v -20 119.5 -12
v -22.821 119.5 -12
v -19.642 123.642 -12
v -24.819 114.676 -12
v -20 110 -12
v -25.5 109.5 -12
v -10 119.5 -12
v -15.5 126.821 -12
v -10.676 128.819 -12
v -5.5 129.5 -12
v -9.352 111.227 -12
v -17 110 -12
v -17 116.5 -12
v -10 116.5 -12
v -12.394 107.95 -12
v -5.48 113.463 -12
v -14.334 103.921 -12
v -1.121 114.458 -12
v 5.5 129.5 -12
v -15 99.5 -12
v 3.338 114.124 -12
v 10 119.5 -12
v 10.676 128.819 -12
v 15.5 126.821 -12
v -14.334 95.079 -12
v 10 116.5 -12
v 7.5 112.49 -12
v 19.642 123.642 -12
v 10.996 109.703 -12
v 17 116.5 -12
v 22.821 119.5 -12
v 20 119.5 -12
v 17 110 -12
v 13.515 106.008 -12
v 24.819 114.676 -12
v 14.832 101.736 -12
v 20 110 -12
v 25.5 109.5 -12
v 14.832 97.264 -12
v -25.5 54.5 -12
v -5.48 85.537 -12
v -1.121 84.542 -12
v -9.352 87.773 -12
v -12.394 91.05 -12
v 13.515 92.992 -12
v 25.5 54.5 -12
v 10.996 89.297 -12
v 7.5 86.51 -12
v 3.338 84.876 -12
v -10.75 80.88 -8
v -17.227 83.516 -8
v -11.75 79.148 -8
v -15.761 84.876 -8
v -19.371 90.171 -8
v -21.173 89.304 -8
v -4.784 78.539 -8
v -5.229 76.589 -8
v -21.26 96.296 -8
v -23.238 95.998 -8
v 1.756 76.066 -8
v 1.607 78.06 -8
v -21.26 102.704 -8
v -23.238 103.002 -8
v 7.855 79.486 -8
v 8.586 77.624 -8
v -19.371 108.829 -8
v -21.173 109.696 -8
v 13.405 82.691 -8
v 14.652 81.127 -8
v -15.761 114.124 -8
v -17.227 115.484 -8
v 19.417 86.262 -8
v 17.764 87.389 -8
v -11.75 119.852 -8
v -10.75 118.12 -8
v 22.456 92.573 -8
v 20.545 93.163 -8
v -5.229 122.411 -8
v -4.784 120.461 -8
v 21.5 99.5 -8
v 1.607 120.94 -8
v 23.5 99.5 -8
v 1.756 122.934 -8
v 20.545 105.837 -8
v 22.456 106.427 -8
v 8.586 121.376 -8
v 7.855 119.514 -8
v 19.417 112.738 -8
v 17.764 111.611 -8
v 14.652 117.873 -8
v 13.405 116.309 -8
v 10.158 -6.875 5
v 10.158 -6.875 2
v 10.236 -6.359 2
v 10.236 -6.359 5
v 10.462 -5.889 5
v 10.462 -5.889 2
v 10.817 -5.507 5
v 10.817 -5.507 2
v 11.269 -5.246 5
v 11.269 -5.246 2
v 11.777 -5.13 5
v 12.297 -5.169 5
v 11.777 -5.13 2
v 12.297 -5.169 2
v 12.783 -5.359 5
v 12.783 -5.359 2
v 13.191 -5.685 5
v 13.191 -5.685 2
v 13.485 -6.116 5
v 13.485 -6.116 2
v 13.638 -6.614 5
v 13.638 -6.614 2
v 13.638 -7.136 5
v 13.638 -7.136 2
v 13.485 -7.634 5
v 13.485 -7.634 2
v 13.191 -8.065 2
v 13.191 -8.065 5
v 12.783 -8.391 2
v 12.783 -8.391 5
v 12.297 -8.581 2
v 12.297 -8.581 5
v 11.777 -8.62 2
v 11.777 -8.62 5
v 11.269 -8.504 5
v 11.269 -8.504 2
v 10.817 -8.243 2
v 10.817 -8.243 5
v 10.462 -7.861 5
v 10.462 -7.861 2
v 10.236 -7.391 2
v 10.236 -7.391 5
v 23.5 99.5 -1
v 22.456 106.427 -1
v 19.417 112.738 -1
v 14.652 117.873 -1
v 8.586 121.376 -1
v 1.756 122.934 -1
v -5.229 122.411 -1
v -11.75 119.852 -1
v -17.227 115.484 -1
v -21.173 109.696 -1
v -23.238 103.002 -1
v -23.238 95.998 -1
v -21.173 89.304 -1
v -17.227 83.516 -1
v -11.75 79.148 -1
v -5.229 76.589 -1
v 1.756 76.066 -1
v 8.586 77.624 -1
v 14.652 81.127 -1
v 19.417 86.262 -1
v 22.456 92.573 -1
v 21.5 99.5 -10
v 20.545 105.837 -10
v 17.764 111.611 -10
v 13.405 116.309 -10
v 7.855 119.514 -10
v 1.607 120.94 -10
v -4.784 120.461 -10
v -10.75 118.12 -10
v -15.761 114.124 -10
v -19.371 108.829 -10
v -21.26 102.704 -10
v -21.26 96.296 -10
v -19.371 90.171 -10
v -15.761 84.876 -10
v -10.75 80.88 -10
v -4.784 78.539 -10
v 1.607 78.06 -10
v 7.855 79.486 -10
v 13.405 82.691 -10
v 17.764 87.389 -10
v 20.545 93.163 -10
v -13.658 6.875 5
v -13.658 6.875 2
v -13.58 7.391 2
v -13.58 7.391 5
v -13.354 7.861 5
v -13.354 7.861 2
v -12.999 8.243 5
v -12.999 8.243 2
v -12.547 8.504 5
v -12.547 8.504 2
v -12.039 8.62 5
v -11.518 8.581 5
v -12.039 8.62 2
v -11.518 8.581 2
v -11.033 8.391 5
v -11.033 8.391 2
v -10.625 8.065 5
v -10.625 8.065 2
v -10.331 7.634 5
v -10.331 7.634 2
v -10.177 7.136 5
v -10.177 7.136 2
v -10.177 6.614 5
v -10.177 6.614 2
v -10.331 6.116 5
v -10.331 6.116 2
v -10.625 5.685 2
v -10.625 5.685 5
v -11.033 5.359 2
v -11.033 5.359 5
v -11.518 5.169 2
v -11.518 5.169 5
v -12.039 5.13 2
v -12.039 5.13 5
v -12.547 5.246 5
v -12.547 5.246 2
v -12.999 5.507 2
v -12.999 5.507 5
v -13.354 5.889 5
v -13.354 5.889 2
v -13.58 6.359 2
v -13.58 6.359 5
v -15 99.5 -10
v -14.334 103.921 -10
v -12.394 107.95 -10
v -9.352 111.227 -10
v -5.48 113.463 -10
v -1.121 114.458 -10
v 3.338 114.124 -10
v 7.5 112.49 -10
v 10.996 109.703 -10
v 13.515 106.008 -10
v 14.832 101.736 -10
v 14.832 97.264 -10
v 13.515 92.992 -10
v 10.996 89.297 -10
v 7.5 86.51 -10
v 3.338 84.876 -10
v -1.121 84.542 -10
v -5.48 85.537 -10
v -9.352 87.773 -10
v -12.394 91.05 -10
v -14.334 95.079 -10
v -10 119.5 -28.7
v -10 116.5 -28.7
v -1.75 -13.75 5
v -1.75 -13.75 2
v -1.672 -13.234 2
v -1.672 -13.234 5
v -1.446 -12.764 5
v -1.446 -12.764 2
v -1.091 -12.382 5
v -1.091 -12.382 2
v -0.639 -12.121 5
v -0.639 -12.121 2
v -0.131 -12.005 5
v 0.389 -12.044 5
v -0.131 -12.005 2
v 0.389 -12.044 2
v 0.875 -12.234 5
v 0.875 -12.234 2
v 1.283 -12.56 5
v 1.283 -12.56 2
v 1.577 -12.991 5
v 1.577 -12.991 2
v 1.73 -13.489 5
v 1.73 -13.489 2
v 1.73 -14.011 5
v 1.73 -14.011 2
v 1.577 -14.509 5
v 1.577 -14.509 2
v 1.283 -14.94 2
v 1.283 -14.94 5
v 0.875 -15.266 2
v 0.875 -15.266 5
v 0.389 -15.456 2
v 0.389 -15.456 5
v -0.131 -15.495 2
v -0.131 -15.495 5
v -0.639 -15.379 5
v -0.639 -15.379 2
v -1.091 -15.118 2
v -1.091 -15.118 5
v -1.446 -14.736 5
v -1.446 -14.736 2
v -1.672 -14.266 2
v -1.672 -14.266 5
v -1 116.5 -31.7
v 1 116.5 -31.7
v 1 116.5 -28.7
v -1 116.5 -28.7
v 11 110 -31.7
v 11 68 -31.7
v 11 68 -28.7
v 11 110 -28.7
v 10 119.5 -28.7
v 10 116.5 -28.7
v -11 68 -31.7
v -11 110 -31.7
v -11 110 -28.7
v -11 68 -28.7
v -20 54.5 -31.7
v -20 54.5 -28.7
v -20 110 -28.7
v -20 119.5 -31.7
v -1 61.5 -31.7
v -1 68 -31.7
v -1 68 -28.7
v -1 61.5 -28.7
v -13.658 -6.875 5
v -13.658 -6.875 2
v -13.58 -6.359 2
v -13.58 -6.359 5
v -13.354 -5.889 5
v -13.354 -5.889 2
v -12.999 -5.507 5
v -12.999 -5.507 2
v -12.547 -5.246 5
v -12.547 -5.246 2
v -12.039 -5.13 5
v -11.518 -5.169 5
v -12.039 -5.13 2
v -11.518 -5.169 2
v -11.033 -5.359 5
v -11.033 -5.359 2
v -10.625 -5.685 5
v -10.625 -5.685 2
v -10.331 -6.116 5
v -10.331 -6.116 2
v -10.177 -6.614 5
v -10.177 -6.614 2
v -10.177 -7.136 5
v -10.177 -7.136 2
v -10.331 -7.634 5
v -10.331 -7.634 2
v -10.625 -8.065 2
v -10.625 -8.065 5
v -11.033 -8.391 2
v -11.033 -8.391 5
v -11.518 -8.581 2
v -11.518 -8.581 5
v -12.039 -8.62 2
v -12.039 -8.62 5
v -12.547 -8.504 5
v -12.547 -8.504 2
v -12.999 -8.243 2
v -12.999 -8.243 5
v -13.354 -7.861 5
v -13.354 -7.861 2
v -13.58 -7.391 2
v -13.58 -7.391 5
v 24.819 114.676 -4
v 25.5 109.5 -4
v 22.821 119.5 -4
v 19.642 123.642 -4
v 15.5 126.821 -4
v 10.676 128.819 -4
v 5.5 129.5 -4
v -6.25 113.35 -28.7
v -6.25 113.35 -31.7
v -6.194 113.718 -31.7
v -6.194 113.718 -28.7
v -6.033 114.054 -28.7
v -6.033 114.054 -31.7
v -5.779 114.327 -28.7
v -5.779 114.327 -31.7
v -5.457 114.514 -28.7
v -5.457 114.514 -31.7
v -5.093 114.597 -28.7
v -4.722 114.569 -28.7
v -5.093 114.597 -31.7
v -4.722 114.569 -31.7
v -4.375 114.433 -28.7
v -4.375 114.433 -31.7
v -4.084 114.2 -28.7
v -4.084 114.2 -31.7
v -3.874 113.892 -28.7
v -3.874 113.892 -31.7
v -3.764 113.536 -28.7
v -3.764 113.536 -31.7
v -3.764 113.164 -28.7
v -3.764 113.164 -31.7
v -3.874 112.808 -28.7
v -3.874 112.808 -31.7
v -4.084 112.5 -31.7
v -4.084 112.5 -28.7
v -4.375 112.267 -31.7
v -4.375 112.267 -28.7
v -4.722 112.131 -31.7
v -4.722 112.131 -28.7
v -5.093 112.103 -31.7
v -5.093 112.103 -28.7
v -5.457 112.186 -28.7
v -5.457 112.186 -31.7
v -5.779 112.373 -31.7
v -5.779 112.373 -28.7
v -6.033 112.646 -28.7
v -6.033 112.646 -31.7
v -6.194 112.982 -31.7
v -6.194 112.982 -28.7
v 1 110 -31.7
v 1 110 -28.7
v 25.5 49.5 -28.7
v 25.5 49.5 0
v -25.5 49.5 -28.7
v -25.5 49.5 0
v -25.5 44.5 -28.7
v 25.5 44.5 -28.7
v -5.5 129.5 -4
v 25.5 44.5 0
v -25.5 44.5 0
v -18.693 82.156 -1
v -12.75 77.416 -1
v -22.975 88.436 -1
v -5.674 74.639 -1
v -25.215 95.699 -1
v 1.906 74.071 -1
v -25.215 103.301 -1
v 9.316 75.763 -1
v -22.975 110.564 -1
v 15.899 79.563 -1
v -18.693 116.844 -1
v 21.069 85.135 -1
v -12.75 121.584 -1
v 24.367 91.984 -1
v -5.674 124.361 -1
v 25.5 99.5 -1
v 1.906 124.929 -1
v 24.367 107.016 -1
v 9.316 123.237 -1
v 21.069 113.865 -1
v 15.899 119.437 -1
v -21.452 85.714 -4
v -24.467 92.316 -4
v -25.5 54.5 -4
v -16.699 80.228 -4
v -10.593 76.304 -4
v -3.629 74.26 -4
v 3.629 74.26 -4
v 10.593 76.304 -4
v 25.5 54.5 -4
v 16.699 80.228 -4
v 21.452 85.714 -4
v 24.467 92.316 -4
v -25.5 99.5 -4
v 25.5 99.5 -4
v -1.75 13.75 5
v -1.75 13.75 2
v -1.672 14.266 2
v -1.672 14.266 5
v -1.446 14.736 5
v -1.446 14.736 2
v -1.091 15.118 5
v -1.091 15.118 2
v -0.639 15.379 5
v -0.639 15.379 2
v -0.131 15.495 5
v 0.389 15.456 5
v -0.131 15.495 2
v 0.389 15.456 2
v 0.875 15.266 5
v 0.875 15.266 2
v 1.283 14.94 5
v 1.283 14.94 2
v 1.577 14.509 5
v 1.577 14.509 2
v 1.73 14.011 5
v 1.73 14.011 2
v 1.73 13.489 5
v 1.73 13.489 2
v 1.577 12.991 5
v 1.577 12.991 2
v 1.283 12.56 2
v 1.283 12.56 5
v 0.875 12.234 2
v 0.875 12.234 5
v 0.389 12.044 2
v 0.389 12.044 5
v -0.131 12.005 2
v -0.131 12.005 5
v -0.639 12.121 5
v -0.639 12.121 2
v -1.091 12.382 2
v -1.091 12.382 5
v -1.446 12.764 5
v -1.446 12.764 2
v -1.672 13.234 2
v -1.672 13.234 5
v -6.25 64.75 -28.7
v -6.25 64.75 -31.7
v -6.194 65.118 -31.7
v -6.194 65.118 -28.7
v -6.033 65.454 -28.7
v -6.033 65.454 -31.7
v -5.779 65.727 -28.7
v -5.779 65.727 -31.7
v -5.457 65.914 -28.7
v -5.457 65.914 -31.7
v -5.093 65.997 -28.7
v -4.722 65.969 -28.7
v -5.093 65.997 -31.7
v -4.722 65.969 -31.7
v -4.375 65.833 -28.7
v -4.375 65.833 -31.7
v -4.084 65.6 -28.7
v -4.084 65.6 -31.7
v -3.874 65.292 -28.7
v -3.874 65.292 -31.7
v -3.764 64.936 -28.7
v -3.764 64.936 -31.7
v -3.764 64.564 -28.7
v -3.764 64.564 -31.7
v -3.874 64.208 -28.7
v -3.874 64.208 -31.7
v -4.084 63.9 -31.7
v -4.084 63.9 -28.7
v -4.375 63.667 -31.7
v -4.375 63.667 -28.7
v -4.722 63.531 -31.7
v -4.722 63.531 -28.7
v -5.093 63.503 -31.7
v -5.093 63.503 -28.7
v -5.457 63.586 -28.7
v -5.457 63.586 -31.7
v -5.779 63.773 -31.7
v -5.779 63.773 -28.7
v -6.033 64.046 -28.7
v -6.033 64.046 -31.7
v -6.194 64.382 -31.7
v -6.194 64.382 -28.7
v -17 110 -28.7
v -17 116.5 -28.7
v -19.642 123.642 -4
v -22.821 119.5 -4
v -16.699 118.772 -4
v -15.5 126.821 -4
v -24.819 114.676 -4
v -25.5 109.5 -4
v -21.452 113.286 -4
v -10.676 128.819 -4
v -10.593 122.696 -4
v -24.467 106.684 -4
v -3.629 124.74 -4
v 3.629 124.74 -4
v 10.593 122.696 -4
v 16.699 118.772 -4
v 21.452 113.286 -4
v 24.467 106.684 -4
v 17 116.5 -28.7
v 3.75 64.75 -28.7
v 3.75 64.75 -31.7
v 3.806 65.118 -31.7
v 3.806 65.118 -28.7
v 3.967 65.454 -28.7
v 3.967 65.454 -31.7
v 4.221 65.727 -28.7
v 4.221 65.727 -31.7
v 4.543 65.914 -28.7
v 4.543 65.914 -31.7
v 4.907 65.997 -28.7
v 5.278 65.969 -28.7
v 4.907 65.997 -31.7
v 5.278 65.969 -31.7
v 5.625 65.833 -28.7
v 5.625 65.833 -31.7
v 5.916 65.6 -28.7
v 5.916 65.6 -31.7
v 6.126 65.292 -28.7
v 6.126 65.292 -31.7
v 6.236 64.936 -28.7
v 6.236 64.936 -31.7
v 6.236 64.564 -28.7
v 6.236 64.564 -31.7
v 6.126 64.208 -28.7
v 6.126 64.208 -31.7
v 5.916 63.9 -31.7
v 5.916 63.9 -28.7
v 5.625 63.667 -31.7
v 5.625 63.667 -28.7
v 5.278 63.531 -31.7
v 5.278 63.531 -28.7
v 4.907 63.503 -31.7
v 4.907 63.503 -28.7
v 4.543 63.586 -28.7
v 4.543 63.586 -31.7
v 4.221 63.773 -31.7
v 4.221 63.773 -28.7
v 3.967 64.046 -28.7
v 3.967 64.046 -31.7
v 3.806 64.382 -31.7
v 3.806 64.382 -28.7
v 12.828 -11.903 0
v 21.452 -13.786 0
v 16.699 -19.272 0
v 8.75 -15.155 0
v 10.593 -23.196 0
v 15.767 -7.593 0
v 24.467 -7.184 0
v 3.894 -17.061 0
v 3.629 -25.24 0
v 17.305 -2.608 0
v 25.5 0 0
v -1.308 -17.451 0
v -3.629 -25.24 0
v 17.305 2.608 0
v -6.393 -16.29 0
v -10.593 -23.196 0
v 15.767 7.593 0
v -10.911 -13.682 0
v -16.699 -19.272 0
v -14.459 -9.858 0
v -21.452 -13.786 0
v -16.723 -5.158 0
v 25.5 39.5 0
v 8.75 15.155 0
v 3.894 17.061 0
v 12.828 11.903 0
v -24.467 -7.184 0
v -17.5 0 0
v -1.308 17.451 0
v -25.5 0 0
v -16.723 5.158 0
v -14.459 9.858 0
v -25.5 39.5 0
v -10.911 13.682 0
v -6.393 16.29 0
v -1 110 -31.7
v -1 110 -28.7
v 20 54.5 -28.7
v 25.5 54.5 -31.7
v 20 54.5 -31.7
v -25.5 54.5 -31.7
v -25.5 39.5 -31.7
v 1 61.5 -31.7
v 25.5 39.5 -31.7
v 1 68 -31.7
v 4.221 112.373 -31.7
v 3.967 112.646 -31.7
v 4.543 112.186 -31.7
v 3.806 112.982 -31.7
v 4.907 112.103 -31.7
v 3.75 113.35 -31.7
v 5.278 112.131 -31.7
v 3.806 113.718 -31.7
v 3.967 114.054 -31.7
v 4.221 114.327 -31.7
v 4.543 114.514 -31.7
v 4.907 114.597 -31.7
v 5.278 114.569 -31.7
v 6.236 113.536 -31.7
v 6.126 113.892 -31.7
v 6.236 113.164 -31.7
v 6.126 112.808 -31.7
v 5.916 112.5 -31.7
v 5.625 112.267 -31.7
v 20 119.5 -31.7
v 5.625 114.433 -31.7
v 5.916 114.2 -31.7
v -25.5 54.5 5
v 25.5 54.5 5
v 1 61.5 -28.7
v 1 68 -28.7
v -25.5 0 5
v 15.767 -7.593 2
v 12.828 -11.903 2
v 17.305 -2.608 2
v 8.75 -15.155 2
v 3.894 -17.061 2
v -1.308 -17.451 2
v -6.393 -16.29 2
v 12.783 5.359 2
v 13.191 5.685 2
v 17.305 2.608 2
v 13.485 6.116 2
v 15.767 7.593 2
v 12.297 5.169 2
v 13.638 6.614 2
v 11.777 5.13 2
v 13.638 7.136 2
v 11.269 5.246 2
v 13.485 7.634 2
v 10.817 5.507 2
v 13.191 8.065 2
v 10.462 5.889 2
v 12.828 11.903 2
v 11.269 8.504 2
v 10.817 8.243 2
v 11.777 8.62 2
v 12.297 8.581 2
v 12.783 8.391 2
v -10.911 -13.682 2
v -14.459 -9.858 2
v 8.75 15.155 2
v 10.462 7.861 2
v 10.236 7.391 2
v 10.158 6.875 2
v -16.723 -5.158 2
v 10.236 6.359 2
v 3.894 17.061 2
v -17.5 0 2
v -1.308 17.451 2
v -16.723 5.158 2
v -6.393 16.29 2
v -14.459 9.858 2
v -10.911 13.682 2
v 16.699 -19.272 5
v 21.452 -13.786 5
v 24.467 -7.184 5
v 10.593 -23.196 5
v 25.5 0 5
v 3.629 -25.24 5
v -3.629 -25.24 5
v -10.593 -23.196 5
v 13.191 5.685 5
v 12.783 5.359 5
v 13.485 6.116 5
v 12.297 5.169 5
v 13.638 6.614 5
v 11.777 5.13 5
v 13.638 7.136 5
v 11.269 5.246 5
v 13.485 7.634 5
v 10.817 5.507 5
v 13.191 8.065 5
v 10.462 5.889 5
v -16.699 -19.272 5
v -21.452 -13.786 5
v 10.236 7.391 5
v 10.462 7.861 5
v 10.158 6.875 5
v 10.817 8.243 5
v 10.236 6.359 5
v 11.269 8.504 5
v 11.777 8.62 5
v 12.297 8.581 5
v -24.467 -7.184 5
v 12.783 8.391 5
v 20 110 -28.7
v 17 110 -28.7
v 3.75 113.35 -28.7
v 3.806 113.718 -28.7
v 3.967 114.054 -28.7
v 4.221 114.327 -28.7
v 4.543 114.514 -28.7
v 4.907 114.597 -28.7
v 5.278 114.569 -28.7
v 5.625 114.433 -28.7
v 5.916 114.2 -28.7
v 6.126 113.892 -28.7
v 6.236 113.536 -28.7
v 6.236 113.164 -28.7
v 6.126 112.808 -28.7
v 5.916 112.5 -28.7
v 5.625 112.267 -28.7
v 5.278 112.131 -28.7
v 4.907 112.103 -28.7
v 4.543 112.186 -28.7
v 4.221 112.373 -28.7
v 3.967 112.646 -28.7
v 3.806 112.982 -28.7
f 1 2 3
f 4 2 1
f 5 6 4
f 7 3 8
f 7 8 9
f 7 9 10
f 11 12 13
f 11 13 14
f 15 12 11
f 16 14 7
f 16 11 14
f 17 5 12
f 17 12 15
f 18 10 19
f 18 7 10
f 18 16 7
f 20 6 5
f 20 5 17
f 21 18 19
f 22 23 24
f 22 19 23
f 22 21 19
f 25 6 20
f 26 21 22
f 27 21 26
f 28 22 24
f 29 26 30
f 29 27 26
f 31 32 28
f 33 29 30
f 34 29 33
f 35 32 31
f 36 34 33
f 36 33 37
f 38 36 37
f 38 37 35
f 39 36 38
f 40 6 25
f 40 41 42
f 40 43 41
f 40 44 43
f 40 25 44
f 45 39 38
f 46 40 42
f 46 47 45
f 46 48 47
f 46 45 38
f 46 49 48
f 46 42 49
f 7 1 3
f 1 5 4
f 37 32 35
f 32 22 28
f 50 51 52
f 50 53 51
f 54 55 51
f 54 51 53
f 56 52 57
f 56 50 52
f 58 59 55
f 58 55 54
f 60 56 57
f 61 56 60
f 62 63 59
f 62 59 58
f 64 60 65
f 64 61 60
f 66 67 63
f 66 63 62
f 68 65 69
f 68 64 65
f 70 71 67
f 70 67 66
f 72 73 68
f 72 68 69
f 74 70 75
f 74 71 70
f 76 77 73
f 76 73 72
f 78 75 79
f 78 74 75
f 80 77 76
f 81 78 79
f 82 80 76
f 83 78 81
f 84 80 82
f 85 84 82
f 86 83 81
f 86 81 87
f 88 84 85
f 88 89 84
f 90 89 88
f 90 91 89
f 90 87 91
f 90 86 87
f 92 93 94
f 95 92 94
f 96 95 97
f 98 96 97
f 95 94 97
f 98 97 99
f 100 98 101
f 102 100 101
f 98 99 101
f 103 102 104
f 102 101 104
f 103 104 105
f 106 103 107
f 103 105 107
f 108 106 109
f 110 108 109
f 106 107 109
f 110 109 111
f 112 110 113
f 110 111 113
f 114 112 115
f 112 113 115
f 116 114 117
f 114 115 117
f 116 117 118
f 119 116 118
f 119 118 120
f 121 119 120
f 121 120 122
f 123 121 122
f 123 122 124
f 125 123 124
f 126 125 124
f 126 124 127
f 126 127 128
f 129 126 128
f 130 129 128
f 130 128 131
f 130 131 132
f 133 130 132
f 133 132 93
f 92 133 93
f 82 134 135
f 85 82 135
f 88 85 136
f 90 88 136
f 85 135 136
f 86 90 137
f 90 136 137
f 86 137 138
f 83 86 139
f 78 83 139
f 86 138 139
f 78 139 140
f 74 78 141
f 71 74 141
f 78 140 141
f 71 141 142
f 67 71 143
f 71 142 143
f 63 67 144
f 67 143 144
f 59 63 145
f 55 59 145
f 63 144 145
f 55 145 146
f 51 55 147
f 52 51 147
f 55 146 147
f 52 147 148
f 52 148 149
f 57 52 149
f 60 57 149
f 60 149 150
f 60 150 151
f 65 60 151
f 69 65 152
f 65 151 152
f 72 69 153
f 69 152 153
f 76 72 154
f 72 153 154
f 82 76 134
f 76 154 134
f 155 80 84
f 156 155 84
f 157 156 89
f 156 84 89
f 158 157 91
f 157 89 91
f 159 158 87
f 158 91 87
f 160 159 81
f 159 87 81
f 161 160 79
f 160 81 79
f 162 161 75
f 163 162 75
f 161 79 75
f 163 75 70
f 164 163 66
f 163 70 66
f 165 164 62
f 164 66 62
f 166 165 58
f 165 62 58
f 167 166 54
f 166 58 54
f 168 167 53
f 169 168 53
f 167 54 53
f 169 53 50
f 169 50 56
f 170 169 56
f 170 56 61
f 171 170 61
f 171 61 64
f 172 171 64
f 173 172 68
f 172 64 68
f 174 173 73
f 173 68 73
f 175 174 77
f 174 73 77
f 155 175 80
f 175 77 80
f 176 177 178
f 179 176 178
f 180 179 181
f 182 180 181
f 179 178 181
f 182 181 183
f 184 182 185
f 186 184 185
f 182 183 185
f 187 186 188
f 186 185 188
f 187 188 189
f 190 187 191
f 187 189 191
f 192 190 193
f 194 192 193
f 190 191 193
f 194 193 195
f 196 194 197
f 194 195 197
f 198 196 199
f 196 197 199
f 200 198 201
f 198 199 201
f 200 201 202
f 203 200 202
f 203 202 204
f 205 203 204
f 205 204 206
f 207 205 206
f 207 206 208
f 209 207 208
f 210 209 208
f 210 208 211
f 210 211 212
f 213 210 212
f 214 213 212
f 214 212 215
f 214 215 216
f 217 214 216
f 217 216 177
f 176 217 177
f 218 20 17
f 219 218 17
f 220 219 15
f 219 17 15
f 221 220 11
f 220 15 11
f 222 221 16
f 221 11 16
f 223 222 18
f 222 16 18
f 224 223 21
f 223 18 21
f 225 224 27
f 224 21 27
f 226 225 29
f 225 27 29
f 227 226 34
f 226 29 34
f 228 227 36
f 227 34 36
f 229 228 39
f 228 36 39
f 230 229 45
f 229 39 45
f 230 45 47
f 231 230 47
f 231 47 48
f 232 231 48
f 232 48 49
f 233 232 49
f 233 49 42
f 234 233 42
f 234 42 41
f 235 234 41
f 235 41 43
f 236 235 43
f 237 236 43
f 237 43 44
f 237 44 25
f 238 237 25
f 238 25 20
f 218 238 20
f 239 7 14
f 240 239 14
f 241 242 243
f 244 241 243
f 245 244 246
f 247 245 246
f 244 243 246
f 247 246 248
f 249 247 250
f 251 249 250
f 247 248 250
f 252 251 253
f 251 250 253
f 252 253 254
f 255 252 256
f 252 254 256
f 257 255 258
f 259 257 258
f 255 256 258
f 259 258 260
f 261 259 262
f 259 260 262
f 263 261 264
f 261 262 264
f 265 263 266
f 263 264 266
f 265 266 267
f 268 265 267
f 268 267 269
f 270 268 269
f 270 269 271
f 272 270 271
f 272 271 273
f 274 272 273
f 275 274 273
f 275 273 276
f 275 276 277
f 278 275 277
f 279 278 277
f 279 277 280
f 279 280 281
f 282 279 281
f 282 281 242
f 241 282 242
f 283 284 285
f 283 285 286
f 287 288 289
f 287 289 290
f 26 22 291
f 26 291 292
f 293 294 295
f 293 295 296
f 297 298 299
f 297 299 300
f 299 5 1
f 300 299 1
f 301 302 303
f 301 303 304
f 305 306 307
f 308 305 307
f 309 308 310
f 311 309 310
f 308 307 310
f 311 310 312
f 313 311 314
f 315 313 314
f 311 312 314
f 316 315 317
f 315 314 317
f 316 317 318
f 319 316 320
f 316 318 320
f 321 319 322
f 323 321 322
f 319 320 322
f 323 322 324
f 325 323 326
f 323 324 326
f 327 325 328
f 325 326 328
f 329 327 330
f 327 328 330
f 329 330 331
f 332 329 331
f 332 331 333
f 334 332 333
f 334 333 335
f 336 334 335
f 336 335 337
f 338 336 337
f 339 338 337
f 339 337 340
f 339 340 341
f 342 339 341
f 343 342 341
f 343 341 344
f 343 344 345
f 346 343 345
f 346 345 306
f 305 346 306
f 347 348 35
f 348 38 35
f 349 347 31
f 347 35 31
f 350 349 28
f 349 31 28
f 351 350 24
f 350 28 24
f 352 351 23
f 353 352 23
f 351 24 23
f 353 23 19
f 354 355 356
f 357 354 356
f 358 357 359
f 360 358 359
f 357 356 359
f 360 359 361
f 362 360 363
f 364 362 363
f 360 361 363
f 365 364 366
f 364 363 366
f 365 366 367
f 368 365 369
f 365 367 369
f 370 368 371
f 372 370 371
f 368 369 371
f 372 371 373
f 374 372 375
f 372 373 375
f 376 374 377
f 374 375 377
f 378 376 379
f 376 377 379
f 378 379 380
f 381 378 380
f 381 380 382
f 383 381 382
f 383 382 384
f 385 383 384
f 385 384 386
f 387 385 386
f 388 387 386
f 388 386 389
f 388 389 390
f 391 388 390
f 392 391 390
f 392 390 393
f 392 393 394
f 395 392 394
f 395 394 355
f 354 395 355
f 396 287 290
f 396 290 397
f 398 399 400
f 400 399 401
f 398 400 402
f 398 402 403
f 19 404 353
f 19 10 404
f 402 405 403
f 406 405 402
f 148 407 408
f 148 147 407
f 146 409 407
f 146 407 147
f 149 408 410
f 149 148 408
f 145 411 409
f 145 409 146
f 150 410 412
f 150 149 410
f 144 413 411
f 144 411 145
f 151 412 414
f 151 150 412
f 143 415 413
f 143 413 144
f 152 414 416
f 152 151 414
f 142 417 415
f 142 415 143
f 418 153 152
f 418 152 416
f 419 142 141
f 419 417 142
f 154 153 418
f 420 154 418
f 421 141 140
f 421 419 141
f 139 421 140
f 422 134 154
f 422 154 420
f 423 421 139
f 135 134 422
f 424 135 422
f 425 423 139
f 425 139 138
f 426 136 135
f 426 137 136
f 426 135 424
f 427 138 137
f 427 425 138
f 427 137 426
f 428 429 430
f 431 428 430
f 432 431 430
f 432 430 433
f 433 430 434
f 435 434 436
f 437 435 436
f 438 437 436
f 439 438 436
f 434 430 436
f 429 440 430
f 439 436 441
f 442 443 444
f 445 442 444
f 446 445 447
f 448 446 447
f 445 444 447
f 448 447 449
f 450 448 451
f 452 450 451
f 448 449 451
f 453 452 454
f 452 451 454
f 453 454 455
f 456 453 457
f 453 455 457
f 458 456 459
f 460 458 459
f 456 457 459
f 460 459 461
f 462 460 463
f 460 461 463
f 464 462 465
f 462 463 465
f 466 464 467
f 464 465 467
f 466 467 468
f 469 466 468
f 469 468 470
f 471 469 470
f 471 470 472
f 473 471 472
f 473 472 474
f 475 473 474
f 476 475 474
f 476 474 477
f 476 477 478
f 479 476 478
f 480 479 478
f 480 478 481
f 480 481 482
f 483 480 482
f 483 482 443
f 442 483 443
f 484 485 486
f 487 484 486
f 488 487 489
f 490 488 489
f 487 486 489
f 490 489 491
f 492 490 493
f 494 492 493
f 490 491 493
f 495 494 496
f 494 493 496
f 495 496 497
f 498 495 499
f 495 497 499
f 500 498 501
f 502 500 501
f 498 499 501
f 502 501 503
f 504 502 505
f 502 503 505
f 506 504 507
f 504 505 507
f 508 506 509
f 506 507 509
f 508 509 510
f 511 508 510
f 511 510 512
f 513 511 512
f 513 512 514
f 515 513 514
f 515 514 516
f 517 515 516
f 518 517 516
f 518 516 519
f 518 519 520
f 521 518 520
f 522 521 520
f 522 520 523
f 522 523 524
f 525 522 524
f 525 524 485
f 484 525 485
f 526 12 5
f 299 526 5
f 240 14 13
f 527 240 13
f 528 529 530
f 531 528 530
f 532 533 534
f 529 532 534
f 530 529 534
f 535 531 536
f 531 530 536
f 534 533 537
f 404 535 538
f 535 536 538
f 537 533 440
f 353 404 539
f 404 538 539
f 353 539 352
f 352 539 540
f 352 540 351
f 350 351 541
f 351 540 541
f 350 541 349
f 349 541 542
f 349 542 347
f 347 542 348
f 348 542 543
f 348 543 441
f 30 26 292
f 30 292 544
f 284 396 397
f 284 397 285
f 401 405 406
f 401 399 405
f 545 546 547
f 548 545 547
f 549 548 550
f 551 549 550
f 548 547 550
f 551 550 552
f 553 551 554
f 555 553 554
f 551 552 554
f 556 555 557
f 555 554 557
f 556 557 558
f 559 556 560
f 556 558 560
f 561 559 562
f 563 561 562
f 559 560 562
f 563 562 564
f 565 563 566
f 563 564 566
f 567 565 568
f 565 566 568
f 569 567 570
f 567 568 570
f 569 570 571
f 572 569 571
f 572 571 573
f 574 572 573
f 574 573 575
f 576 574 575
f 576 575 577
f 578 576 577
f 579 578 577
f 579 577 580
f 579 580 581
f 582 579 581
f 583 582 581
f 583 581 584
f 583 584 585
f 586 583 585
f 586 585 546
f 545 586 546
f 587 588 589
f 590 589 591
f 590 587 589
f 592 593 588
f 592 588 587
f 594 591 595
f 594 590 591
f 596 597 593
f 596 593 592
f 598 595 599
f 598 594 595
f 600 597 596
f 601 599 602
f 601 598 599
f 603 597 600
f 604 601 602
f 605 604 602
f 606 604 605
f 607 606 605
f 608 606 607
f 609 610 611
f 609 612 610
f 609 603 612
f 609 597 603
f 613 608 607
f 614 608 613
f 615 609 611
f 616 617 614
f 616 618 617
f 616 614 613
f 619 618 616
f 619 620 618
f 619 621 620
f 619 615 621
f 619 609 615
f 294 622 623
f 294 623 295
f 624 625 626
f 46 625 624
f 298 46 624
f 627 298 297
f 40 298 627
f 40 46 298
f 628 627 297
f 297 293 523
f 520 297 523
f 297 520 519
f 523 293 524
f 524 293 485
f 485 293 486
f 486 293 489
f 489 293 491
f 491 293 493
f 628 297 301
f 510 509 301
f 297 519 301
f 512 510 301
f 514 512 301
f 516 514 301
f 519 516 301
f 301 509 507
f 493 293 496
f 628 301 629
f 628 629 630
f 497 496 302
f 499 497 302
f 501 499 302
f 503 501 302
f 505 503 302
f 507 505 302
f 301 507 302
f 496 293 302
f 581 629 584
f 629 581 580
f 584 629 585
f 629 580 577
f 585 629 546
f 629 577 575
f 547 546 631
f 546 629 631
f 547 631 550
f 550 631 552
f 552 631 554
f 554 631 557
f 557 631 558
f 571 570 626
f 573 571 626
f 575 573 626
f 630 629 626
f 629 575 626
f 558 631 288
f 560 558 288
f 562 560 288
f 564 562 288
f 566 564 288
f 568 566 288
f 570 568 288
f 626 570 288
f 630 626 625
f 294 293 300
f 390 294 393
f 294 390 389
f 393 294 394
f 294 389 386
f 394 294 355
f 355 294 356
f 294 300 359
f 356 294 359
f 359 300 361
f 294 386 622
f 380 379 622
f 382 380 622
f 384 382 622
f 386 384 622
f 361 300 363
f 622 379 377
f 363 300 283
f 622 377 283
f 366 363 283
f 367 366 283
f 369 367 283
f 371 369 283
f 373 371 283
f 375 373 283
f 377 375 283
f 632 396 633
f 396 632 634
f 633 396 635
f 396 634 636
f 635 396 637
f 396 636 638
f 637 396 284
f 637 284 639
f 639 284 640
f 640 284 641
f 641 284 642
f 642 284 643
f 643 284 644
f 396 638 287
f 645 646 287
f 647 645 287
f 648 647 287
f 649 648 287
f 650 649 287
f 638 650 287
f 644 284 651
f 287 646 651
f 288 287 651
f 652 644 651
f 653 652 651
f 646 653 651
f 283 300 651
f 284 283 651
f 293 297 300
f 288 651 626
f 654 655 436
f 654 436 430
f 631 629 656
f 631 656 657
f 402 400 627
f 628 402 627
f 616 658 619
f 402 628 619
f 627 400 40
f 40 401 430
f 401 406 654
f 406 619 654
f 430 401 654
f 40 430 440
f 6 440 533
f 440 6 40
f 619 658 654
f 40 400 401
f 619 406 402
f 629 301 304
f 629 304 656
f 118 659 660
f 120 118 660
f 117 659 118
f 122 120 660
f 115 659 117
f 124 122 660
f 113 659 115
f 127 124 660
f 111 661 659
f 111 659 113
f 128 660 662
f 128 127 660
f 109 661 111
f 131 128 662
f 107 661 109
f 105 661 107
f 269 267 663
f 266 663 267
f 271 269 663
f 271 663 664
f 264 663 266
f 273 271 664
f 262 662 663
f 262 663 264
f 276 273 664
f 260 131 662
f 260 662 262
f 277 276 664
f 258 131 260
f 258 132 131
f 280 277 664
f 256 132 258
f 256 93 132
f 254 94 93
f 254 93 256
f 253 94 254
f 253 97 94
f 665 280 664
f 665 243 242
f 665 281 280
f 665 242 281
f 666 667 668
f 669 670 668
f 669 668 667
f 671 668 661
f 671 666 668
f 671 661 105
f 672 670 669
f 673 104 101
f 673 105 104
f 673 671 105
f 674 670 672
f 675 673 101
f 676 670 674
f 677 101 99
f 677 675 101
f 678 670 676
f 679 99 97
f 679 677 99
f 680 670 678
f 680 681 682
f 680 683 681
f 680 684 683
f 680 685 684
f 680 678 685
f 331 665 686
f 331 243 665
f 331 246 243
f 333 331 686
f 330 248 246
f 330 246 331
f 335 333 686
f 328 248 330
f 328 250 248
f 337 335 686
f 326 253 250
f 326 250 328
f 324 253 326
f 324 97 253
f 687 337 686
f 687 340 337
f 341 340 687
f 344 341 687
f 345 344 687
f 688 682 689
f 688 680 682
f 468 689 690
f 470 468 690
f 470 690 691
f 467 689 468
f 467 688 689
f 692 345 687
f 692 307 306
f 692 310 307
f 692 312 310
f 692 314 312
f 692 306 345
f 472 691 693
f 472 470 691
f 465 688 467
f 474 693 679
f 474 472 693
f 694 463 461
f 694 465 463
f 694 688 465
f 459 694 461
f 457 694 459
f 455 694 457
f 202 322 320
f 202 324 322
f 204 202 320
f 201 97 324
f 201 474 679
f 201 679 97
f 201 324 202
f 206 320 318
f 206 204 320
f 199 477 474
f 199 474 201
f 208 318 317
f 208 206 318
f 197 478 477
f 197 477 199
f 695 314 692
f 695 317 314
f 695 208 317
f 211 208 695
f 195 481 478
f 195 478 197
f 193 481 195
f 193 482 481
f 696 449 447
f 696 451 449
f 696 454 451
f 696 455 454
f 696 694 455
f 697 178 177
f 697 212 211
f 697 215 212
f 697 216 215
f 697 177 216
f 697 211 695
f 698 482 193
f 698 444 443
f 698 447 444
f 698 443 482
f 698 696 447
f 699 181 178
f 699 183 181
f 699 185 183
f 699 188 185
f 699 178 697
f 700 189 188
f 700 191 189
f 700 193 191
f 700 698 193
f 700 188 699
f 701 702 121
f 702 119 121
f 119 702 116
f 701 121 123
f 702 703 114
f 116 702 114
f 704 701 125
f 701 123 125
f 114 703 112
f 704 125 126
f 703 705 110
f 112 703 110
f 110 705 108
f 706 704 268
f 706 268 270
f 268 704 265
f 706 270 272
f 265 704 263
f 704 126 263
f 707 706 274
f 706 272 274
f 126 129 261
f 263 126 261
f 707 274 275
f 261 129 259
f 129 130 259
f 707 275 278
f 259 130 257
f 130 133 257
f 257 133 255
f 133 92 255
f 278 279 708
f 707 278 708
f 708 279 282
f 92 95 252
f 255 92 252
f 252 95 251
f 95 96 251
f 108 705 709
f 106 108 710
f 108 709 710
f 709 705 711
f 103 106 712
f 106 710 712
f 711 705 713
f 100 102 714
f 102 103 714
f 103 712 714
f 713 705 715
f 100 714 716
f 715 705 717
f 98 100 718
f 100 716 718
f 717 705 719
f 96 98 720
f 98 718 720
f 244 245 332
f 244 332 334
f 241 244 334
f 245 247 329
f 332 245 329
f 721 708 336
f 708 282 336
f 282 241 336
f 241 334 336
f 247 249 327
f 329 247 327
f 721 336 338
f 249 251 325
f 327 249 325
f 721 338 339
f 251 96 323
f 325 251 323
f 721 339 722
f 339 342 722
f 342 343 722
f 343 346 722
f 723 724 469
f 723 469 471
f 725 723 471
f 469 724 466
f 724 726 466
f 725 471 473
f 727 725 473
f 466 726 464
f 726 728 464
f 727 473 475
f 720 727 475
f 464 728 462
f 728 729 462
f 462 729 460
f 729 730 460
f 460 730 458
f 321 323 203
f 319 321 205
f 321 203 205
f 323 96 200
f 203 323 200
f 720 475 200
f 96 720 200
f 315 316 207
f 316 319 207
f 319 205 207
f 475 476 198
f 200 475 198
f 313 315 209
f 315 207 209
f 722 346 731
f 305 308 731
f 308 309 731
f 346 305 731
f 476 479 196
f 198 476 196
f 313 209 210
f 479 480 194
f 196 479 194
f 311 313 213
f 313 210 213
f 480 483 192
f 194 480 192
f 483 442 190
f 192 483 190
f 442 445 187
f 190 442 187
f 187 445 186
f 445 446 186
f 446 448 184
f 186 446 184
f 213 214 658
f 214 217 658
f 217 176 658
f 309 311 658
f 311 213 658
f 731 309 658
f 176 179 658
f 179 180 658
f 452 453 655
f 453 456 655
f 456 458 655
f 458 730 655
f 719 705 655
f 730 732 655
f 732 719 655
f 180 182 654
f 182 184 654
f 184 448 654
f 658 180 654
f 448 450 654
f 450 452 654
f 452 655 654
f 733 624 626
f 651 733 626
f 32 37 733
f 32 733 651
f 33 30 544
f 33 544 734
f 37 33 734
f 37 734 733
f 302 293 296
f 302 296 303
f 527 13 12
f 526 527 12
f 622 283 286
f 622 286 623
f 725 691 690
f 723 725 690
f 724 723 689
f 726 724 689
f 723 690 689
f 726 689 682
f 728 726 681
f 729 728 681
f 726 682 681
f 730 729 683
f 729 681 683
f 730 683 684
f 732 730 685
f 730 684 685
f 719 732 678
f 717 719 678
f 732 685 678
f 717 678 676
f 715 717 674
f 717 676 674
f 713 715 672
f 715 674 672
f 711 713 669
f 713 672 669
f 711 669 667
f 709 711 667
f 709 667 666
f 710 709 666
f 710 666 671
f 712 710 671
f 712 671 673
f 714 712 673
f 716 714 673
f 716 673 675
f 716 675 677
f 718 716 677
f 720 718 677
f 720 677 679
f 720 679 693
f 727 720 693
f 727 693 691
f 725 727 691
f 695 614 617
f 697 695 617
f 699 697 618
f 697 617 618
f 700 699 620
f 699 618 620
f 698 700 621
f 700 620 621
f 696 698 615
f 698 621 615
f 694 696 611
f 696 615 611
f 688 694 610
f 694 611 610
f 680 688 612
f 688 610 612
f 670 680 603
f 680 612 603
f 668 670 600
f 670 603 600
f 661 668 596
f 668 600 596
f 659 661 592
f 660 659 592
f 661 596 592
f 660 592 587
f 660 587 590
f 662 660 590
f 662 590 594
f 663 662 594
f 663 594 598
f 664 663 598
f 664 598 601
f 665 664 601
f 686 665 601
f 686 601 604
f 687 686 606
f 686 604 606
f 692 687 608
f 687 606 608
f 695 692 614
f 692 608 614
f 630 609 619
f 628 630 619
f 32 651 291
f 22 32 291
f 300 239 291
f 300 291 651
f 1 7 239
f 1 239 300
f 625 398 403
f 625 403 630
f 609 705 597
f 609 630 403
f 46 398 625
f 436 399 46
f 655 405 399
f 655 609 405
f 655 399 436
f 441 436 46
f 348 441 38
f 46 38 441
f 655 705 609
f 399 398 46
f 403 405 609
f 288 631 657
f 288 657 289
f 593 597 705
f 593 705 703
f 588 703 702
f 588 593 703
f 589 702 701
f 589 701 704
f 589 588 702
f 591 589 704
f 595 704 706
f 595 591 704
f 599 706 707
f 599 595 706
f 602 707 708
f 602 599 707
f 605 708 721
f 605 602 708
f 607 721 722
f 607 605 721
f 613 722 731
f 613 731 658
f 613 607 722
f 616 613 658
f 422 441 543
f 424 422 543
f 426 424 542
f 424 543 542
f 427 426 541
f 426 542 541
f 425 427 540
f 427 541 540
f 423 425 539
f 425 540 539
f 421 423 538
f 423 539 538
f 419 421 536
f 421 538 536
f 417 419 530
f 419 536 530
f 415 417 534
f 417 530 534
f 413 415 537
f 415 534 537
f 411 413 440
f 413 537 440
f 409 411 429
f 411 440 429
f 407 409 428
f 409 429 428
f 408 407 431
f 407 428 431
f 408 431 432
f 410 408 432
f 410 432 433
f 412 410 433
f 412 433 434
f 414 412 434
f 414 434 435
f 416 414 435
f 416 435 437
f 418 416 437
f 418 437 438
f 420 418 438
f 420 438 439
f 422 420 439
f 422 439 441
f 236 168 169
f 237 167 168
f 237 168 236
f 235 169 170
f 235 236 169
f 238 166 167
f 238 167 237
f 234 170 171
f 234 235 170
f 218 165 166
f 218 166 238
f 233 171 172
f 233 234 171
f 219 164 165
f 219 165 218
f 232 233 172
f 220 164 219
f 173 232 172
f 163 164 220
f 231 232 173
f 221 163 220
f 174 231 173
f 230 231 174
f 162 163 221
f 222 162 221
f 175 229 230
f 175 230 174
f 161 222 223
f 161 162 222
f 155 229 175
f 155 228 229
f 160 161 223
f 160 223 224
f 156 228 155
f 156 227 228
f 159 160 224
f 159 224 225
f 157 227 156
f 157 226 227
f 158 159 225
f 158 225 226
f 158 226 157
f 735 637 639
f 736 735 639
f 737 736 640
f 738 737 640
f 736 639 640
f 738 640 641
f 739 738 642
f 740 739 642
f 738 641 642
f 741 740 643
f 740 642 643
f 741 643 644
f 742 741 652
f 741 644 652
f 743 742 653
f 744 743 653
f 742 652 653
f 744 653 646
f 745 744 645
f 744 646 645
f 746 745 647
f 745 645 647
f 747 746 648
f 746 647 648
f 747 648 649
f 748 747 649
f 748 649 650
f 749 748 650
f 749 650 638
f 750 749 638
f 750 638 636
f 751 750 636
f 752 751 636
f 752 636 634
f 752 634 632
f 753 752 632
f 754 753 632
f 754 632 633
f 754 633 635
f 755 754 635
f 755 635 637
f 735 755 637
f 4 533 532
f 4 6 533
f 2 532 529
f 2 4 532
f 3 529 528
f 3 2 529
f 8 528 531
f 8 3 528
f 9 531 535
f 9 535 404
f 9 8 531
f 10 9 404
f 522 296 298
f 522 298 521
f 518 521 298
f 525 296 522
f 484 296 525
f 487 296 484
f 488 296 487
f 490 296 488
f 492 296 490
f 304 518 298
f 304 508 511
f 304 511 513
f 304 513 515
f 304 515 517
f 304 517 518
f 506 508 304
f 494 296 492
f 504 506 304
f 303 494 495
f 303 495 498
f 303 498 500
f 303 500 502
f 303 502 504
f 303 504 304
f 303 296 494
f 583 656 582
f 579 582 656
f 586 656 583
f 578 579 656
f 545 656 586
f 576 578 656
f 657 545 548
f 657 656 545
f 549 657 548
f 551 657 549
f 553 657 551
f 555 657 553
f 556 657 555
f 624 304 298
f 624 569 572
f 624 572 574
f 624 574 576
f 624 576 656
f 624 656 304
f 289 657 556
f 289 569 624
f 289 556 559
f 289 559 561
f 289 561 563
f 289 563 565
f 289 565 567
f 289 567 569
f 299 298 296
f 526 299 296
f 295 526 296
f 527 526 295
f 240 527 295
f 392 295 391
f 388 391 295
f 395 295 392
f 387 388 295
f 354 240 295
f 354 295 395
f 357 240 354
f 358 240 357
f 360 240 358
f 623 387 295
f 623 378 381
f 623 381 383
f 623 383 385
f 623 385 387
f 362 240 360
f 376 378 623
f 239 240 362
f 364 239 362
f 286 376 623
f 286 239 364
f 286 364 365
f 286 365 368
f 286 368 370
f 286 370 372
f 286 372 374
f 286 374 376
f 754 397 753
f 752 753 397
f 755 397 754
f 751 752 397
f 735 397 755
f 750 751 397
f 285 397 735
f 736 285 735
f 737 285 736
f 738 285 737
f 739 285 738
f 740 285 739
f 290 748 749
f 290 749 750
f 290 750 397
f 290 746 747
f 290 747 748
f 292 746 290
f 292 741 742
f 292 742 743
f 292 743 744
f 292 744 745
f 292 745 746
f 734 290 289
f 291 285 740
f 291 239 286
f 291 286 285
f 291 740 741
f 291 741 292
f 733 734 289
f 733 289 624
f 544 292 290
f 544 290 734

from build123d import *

# Parameters (mm, degrees)
EXTRUDE_1_DEPTH     = 5
SKETCH_2_R          = 17.5
CUT_EXTRUDE_1_DEPTH = 2
SKETCH_3_R          = 1.75
CUT_EXTRUDE_2_DEPTH = 61.245331769
SKETCH_4_W          = 51
SKETCH_4_H          = 5
EXTRUDE_2_DEPTH     = 31.7
SKETCH_12_W         = 51
SKETCH_12_H         = 8
EXTRUDE_7_DEPTH     = 75
FILLET_2_R          = 20
CUT_EXTRUDE_6_REACH = 135.449
SKETCH_13_R         = 15
SKETCH_14_R         = 25.5
EXTRUDE_8_DEPTH     = 3
SKETCH_16_R         = 23.5
CUT_EXTRUDE_7_DEPTH = 7
SKETCH_17_R         = 21.5
CUT_EXTRUDE_8_DEPTH = 2
EXTRUDE_9_DEPTH     = 19.7
EXTRUDE_10_DEPTH    = 3
CUT_EXTRUDE_9_REACH = 138.994
SKETCH_20_R         = 1.25


with BuildPart() as part:
    # 스케치1 → 보스-돌출1 (new body)
    with BuildSketch(Plane.XY):
        with BuildLine():
            Line((-25.5, 0), (-25.5, 54.5))
            Line((-25.5, 54.5), (25.5, 54.5))
            Line((25.5, 54.5), (25.5, 0))
            ThreePointArc((25.5, 0), (0, -25.5), (-25.5, 0))
        make_face()
    extrude(amount=EXTRUDE_1_DEPTH)

    # 스케치2 → 컷-돌출1 (cut)
    with BuildSketch(Plane(origin=(0, 0, 0), x_dir=(-1, 0, 0), z_dir=(0, 0, -1))):
        Circle(SKETCH_2_R)
    extrude(amount=-CUT_EXTRUDE_1_DEPTH, mode=Mode.SUBTRACT)

    # 스케치3 → 컷-돌출2 (cut, through all)
    with BuildSketch(Plane(origin=(0, 0, 2), x_dir=(-1, 0, 0), z_dir=(0, 0, -1))):
        with Locations((0, 13.75)):
            Circle(SKETCH_3_R)
        with Locations((11.907849302, 6.875)):
            Circle(SKETCH_3_R)
        with Locations((11.907849302, -6.875)):
            Circle(SKETCH_3_R)
        with Locations((0, -13.75)):
            Circle(SKETCH_3_R)
        with Locations((-11.907849302, -6.875)):
            Circle(SKETCH_3_R)
        with Locations((-11.907849302, 6.875)):
            Circle(SKETCH_3_R)
    extrude(amount=-CUT_EXTRUDE_2_DEPTH, mode=Mode.SUBTRACT)

    # 스케치4 → 보스-돌출2 (add)
    with BuildSketch(Plane(origin=(0, 0, 0), x_dir=(-1, 0, 0), z_dir=(0, 0, -1))):
        with Locations((0, 52)):
            Rectangle(SKETCH_4_W, SKETCH_4_H)
        with Locations((0, 42)):
            Rectangle(SKETCH_4_W, SKETCH_4_H)
    extrude(amount=EXTRUDE_2_DEPTH)

    # 스케치12 → 보스-돌출7 (add)
    with BuildSketch(Plane(origin=(0, 54.5, 0), x_dir=(1, 0, 0), z_dir=(0, 1, 0))):
        with Locations((0, 8)):
            Rectangle(SKETCH_12_W, SKETCH_12_H)
    extrude(amount=EXTRUDE_7_DEPTH)

    # 필렛2
    fillet_2_edges = [part.edges().sort_by_distance(p)[0] for p in [
        (-25.5, 129.5, -8),
        (25.5, 129.5, -8),
    ]]
    fillet(fillet_2_edges, radius=FILLET_2_R)

    # 스케치13 → 컷-돌출6 (cut, up to next)
    with BuildSketch(Plane(origin=(0, 0, -12), x_dir=(-1, 0, 0), z_dir=(0, 0, -1)), mode=Mode.PRIVATE) as cut_extrude_6_sk1:
        with Locations((0, 99.5)):
            Circle(SKETCH_13_R)
    cut_extrude_6_tool1 = extrude(cut_extrude_6_sk1.sketch, amount=-CUT_EXTRUDE_6_REACH, mode=Mode.PRIVATE) & part.part
    add(cut_extrude_6_tool1.solids().sort_by_distance((0, 99.5, -12))[0], mode=Mode.SUBTRACT)

    # 스케치14 → 보스-돌출8 (add)
    with BuildSketch(Plane.XY.offset(-4)):
        with Locations((0, 99.5)):
            Circle(SKETCH_14_R)
    extrude(amount=EXTRUDE_8_DEPTH)

    # 스케치16 → 컷-돌출7 (cut)
    with BuildSketch(Plane.XY.offset(-1)):
        with Locations((0, 99.5)):
            Circle(SKETCH_16_R)
    extrude(amount=-CUT_EXTRUDE_7_DEPTH, mode=Mode.SUBTRACT)

    # 스케치17 → 컷-돌출8 (cut)
    with BuildSketch(Plane.XY.offset(-8)):
        with Locations((0, 99.5)):
            Circle(SKETCH_17_R)
    extrude(amount=-CUT_EXTRUDE_8_DEPTH, mode=Mode.SUBTRACT)

    # 스케치18 → 보스-돌출9 (add)
    with BuildSketch(Plane(origin=(0, 0, -12), x_dir=(-1, 0, 0), z_dir=(0, 0, -1))):
        Polygon((-20, 119.5), (-10, 119.5), (-10, 116.5), (-17, 116.5), (-17, 110), (-20, 110), align=None)
        Polygon((20, 119.5), (10, 119.5), (10, 116.5), (17, 116.5), (17, 110), (20, 110), align=None)
    extrude(amount=EXTRUDE_9_DEPTH)

    # 스케치19 → 보스-돌출10 (add)
    with BuildSketch(Plane(origin=(0, 0, -31.7), x_dir=(-1, 0, 0), z_dir=(0, 0, -1))):
        Polygon((-20, 119.5), (20, 119.5), (20, 54.5), (25.5, 54.5), (25.5, 39.5), (-25.5, 39.5), (-25.5, 54.5), (-20, 54.5), align=None)
    extrude(amount=-EXTRUDE_10_DEPTH)

    # 스케치20 → 컷-돌출9 (cut, up to next)
    with BuildSketch(Plane(origin=(0, 0, -31.7), x_dir=(-1, 0, 0), z_dir=(0, 0, -1)), mode=Mode.PRIVATE) as cut_extrude_9_sk1:
        with Locations((-5, 113.35)):
            Circle(SKETCH_20_R)
    cut_extrude_9_tool1 = extrude(cut_extrude_9_sk1.sketch, amount=-CUT_EXTRUDE_9_REACH, mode=Mode.PRIVATE) & part.part
    # 스케치20 → 컷-돌출9 (cut, up to next)
    with BuildSketch(Plane(origin=(0, 0, -31.7), x_dir=(-1, 0, 0), z_dir=(0, 0, -1)), mode=Mode.PRIVATE) as cut_extrude_9_sk2:
        with Locations((5, 113.35)):
            Circle(SKETCH_20_R)
    cut_extrude_9_tool2 = extrude(cut_extrude_9_sk2.sketch, amount=-CUT_EXTRUDE_9_REACH, mode=Mode.PRIVATE) & part.part
    # 스케치20 → 컷-돌출9 (cut, up to next)
    with BuildSketch(Plane(origin=(0, 0, -31.7), x_dir=(-1, 0, 0), z_dir=(0, 0, -1)), mode=Mode.PRIVATE) as cut_extrude_9_sk3:
        with Locations((-5, 64.75)):
            Circle(SKETCH_20_R)
    cut_extrude_9_tool3 = extrude(cut_extrude_9_sk3.sketch, amount=-CUT_EXTRUDE_9_REACH, mode=Mode.PRIVATE) & part.part
    # 스케치20 → 컷-돌출9 (cut, up to next)
    with BuildSketch(Plane(origin=(0, 0, -31.7), x_dir=(-1, 0, 0), z_dir=(0, 0, -1)), mode=Mode.PRIVATE) as cut_extrude_9_sk4:
        with Locations((5, 64.75)):
            Circle(SKETCH_20_R)
    cut_extrude_9_tool4 = extrude(cut_extrude_9_sk4.sketch, amount=-CUT_EXTRUDE_9_REACH, mode=Mode.PRIVATE) & part.part
    # 스케치20 → 컷-돌출9 (cut, up to next)
    with BuildSketch(Plane(origin=(0, 0, -31.7), x_dir=(-1, 0, 0), z_dir=(0, 0, -1)), mode=Mode.PRIVATE) as cut_extrude_9_sk5:
        Polygon((1, 110), (11, 110), (11, 68), (1, 68), (1, 61.5), (-1, 61.5), (-1, 68), (-11, 68), (-11, 110), (-1, 110), (-1, 116.5), (1, 116.5), align=None)
    cut_extrude_9_tool5 = extrude(cut_extrude_9_sk5.sketch, amount=-CUT_EXTRUDE_9_REACH, mode=Mode.PRIVATE) & part.part
    add(cut_extrude_9_tool1.solids().sort_by_distance((5, 113.35, -31.7))[0], mode=Mode.SUBTRACT)
    add(cut_extrude_9_tool2.solids().sort_by_distance((-5, 113.35, -31.7))[0], mode=Mode.SUBTRACT)
    add(cut_extrude_9_tool3.solids().sort_by_distance((5, 64.75, -31.7))[0], mode=Mode.SUBTRACT)
    add(cut_extrude_9_tool4.solids().sort_by_distance((-5, 64.75, -31.7))[0], mode=Mode.SUBTRACT)
    add(cut_extrude_9_tool5.solids().sort_by_distance((0, 89, -31.7))[0], mode=Mode.SUBTRACT)


solid = part.part
